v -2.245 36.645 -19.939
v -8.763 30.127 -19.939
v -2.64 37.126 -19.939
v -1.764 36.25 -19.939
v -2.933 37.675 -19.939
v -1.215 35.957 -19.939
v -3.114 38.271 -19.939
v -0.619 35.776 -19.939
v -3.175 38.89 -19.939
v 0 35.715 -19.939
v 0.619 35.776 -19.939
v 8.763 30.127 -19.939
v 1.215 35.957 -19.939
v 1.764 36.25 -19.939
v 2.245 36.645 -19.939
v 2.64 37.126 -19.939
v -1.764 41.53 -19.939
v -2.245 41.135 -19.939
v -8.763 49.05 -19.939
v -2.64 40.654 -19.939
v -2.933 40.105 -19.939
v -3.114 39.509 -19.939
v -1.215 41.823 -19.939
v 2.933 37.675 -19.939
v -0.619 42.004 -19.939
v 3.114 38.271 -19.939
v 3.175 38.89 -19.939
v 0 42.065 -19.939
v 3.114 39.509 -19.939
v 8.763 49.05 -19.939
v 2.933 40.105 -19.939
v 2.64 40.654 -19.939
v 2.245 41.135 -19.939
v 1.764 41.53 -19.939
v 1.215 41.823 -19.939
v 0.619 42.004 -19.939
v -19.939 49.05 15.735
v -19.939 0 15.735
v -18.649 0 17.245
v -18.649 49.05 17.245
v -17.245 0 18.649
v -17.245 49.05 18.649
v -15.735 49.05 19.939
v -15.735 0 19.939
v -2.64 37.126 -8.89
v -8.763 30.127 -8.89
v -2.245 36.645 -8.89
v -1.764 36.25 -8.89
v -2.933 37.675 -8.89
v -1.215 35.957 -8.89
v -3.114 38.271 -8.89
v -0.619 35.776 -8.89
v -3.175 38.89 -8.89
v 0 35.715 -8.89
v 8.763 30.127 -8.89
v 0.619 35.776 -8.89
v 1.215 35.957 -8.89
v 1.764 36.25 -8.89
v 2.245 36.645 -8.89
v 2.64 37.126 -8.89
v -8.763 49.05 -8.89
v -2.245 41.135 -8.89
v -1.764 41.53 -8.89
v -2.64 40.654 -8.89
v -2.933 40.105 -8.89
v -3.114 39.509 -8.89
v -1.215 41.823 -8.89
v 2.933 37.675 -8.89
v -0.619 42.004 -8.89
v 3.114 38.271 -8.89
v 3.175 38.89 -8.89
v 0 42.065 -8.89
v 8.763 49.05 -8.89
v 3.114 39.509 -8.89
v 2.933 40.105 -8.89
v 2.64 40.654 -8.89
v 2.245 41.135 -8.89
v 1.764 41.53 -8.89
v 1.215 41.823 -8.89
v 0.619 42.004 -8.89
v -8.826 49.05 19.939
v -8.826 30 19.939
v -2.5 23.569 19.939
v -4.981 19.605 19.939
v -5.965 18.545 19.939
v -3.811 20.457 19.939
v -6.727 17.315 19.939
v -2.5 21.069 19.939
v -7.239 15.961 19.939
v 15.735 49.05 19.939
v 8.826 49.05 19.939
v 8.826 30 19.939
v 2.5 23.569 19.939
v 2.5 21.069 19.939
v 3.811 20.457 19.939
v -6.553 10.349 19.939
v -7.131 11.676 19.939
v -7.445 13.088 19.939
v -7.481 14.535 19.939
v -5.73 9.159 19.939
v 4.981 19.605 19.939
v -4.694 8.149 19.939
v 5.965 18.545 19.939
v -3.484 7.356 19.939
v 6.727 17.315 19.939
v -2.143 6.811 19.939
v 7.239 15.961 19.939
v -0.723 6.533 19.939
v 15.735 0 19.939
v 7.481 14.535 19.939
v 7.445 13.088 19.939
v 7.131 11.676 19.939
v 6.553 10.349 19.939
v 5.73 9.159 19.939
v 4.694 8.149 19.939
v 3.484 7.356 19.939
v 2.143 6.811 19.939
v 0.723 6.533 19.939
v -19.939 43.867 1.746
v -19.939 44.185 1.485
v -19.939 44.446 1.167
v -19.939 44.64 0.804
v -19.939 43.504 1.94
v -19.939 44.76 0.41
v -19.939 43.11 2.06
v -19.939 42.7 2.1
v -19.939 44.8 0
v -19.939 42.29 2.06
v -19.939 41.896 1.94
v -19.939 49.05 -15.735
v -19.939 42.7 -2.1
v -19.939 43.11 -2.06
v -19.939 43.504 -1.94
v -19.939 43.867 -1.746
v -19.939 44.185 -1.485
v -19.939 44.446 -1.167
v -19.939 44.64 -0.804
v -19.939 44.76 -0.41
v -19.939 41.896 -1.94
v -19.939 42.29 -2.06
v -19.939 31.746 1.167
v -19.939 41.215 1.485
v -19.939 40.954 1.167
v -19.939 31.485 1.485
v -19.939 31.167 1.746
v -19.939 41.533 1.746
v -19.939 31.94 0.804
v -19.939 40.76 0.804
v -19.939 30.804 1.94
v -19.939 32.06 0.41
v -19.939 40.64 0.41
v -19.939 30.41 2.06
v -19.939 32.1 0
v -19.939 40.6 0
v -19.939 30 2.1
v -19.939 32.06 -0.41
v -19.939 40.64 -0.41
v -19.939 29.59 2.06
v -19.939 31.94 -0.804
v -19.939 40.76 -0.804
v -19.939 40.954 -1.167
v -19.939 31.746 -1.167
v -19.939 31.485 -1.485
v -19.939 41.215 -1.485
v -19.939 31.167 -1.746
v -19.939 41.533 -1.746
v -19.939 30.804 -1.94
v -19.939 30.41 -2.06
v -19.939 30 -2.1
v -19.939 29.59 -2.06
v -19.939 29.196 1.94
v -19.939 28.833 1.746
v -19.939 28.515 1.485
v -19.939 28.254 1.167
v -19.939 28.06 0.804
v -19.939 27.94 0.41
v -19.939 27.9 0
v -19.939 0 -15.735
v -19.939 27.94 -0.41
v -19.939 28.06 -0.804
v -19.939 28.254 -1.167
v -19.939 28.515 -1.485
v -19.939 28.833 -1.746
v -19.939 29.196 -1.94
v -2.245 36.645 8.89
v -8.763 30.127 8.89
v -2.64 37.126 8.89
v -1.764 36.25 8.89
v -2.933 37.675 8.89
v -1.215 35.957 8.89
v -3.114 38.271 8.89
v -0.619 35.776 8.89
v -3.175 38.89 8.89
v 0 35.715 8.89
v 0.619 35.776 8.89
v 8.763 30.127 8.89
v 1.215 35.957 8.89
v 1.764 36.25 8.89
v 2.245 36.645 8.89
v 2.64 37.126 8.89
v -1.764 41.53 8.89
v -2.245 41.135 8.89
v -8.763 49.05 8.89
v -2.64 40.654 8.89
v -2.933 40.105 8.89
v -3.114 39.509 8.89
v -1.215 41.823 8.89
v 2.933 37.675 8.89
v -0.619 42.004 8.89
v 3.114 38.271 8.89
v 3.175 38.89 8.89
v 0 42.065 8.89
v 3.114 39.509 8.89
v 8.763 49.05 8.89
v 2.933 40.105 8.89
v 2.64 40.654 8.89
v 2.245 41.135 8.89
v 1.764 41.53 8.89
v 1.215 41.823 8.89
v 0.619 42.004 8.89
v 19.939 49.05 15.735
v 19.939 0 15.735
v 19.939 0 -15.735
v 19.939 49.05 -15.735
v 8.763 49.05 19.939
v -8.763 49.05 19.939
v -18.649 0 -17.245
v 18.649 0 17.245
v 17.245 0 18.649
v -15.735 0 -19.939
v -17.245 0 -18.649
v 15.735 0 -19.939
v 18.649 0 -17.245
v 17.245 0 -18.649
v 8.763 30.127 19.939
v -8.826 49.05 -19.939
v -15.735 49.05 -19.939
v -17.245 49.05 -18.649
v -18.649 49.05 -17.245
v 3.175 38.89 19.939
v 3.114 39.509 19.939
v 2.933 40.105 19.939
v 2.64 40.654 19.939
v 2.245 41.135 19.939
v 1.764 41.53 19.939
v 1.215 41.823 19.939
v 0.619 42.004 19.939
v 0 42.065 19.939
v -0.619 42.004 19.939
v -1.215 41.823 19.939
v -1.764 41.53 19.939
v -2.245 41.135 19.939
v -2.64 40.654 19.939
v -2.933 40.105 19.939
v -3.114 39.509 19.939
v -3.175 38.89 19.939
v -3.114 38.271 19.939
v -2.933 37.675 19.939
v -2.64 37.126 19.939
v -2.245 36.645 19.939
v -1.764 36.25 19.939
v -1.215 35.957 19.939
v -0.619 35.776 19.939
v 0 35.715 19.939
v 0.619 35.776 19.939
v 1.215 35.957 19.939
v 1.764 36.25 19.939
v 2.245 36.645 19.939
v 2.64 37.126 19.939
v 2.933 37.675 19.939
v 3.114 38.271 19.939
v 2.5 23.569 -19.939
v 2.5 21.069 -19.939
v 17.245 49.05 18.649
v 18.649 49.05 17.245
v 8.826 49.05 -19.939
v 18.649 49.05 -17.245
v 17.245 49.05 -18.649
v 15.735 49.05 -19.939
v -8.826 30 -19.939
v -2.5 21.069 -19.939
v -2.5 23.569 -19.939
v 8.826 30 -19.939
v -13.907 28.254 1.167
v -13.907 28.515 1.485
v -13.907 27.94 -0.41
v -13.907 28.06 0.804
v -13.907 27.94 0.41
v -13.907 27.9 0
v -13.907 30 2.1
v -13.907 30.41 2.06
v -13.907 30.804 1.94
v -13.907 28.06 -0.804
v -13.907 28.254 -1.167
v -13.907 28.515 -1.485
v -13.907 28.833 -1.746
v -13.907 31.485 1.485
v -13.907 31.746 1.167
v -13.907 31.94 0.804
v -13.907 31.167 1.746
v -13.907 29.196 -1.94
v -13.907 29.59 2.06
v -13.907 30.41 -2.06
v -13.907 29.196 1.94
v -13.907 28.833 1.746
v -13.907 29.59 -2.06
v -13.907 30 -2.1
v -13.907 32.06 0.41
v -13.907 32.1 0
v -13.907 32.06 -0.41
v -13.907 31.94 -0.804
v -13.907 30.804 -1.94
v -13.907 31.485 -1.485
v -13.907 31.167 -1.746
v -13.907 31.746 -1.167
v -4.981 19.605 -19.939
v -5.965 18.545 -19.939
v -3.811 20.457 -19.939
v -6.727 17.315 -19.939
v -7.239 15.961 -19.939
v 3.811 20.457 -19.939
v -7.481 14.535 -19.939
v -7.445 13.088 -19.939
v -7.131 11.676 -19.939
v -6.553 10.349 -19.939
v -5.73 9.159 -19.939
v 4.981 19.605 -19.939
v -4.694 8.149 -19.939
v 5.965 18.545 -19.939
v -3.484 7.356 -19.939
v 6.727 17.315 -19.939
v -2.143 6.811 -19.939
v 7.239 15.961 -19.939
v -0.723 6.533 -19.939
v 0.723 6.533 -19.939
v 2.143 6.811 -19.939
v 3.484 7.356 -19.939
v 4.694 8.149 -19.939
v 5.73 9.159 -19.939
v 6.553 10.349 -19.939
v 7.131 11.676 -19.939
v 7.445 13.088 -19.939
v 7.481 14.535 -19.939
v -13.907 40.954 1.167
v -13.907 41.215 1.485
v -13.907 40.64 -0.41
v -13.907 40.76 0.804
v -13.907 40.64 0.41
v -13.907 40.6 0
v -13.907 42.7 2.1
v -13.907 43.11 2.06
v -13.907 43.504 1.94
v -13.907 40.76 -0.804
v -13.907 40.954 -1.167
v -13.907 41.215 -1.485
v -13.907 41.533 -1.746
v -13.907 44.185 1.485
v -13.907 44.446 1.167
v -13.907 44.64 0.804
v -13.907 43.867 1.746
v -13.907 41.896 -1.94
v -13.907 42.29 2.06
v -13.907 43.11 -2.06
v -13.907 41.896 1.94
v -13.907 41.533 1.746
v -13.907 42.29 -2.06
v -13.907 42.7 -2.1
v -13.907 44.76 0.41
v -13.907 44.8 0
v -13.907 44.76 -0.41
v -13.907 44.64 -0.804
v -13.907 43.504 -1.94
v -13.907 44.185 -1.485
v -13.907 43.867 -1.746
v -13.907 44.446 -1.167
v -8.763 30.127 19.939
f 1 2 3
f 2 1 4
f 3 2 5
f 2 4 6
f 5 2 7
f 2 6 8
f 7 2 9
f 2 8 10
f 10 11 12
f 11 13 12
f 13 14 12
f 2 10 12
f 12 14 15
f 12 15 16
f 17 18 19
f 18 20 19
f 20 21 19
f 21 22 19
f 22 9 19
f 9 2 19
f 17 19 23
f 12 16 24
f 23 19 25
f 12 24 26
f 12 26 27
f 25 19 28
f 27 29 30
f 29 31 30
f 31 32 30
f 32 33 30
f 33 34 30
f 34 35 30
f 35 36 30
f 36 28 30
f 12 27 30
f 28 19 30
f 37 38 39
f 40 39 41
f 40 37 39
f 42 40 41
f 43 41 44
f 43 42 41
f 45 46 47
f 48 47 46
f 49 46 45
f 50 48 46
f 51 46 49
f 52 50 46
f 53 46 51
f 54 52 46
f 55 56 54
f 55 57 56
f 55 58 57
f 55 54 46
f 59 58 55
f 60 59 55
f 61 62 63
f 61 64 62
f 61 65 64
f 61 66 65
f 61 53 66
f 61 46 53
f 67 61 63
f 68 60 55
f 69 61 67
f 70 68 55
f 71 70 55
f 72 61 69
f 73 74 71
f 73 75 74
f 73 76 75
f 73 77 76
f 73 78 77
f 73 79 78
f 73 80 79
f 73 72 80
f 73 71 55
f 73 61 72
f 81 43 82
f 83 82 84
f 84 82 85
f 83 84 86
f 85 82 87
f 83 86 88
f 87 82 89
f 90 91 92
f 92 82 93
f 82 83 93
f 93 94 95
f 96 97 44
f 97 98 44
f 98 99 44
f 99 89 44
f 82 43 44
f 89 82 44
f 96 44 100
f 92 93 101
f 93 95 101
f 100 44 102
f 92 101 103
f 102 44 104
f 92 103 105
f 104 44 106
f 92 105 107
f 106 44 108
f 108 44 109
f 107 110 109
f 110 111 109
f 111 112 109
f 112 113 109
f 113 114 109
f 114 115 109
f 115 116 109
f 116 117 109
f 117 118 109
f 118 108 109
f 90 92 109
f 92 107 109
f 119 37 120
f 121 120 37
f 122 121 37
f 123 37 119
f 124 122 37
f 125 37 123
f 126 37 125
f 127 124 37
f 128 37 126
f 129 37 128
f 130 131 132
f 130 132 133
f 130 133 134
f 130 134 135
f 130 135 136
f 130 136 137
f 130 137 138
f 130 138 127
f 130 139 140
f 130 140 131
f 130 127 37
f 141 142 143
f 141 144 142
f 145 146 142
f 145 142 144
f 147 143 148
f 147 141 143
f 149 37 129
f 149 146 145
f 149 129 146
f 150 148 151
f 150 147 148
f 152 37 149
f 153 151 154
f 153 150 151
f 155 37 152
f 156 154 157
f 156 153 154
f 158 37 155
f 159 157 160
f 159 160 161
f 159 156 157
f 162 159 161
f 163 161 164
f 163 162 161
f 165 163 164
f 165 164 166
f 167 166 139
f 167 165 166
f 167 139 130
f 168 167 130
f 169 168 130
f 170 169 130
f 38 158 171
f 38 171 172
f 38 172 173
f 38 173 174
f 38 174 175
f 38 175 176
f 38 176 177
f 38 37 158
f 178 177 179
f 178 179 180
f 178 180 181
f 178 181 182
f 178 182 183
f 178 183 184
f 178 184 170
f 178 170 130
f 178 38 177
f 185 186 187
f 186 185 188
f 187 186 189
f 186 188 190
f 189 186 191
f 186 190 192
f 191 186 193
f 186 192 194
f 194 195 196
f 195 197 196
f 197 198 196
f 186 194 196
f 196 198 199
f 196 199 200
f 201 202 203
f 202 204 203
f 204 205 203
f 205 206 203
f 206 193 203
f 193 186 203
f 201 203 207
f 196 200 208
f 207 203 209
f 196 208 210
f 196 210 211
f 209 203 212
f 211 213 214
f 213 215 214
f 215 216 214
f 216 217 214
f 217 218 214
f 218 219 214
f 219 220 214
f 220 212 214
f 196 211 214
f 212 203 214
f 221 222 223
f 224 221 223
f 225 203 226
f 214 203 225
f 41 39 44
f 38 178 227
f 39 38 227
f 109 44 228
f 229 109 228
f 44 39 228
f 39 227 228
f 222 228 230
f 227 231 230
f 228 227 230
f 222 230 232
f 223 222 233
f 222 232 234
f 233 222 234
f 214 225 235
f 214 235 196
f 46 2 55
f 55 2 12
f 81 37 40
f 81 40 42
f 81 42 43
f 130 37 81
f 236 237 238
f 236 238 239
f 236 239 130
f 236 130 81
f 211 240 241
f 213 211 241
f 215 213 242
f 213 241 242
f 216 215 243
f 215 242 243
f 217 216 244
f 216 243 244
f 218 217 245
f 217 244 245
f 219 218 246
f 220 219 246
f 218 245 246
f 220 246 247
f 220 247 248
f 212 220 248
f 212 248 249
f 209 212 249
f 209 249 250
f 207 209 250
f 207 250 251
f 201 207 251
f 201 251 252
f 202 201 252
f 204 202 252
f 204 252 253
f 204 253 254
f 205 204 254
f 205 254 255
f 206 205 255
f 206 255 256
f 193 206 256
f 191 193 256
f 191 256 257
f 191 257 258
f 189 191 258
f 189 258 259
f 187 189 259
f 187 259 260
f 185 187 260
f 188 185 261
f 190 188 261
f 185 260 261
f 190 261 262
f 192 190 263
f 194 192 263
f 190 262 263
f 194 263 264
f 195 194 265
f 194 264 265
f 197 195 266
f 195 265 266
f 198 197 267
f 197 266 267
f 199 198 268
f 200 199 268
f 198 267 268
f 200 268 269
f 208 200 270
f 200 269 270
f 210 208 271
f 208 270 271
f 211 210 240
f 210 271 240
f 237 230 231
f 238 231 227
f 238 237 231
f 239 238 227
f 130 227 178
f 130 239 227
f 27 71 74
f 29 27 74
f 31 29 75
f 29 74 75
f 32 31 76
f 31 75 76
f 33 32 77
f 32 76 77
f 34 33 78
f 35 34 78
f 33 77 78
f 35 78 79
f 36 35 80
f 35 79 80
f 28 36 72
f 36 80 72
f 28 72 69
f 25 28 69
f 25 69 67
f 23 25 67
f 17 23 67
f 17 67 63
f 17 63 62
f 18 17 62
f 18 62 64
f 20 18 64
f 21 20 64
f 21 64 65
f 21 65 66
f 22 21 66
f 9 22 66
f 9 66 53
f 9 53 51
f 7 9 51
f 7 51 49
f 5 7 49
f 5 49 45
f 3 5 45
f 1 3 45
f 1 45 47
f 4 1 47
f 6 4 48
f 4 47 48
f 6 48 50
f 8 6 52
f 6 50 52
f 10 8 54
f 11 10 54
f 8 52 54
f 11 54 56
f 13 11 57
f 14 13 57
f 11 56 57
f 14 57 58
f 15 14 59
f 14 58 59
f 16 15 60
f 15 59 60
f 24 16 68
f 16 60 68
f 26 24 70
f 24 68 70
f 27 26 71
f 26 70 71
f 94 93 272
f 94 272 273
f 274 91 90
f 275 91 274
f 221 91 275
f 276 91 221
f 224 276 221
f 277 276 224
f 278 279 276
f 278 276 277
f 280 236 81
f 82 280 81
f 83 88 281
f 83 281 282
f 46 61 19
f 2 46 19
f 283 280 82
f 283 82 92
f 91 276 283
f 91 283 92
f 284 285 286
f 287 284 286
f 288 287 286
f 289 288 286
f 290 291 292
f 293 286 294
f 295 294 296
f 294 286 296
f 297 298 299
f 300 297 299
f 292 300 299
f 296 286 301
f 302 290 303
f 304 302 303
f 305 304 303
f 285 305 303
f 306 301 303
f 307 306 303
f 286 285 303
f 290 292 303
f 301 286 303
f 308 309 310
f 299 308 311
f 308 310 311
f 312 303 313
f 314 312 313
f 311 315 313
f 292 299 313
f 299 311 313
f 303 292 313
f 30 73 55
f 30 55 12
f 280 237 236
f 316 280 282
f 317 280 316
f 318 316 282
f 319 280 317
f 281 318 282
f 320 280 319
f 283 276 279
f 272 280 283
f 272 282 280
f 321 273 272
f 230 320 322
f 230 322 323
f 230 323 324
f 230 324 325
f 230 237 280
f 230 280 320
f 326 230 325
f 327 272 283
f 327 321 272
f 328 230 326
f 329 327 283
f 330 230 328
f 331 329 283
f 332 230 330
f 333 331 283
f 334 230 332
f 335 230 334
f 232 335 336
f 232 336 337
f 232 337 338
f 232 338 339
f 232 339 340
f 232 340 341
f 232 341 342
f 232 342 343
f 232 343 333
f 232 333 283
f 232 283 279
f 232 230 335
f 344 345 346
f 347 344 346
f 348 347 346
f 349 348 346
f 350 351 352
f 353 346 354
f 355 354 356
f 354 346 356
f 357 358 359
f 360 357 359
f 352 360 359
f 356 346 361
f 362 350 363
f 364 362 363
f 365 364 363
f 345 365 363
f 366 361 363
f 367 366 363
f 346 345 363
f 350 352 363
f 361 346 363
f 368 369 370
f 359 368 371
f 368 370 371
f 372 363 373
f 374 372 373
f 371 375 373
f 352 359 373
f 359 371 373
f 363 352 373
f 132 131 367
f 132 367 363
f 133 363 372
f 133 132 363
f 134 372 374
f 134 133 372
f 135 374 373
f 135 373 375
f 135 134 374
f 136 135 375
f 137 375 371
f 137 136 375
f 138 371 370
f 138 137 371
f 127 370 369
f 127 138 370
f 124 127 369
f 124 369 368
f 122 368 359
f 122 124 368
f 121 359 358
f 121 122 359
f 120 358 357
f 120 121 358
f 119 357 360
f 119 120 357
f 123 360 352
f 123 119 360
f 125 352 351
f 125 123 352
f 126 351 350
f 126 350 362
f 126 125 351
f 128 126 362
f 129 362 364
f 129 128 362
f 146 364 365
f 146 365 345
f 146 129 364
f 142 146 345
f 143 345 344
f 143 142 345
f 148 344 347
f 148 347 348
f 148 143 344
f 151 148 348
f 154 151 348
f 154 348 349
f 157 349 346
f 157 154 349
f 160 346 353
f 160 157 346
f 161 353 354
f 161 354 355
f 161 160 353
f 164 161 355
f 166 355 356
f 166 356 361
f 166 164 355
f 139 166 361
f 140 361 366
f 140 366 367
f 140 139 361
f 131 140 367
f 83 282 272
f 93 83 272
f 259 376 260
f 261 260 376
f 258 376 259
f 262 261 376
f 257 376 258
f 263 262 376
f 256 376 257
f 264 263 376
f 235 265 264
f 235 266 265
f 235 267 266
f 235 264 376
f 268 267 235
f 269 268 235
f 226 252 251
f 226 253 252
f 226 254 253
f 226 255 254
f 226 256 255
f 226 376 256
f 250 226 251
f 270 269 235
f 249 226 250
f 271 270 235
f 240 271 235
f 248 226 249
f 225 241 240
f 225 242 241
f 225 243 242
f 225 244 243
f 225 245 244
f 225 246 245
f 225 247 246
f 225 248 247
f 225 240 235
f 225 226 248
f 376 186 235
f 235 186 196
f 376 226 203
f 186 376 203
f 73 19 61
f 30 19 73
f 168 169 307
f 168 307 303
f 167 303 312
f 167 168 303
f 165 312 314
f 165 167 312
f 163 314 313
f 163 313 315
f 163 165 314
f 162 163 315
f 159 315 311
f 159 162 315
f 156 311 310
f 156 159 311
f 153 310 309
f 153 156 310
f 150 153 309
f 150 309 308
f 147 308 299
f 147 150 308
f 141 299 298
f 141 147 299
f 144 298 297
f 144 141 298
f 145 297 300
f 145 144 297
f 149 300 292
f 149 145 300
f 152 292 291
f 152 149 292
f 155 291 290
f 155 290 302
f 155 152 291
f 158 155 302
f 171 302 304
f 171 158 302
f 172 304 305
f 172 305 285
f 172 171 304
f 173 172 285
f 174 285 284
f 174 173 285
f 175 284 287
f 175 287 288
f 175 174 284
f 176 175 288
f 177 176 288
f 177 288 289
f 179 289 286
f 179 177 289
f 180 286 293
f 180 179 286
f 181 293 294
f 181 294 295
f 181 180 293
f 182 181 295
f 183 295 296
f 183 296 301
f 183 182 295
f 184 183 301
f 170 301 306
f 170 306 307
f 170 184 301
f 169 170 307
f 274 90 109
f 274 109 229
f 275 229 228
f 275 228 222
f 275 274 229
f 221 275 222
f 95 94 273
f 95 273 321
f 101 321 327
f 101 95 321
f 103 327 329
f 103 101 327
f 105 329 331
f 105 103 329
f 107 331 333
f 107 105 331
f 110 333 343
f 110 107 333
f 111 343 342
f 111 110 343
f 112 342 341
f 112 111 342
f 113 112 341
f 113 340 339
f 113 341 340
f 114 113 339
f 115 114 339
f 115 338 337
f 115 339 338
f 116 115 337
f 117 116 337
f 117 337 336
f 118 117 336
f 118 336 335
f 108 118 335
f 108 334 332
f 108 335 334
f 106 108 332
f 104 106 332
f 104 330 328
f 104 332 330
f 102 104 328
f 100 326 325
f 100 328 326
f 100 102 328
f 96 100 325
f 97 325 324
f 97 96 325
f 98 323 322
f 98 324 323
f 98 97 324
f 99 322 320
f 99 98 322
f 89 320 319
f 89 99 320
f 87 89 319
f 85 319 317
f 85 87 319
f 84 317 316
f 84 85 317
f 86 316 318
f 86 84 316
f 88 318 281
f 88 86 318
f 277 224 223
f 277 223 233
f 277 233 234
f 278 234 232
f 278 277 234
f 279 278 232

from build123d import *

# Parameters (mm, degrees)
SKETCH1_W             = 39.878
SKETCH1_H             = 39.878
BOSS_EXTRUDE1_DEPTH   = 49.05
SKETCH2_W             = 17.653
SKETCH2_H             = 39.878
CUT_EXTRUDE1_DEPTH    = 19.05
SKETCH4_R             = 30.48
SKETCH4_R_2           = 25.4
CUT_EXTRUDE3_DEPTH    = 57.57764525
CUT_EXTRUDE5_DEPTH    = 67.285149958
SKETCH7_W             = 17.526
SKETCH7_H             = 11.049
BOSS_EXTRUDE2_DEPTH   = 18.923
BOSS_EXTRUDE2_2_DEPTH = 18.923
SKETCH8_R             = 3.175
CUT_EXTRUDE6_DEPTH    = 67.285149958
SKETCH9_R             = 2.1
CUT_EXTRUDE7_DEPTH    = 6.0325


with BuildPart() as part:
    # Sketch1 → Boss-Extrude1 (new body)
    with BuildSketch(Plane(origin=(0, 0, 0), x_dir=(1, 0, 0), z_dir=(0, 1, 0))):
        Rectangle(SKETCH1_W, SKETCH1_H)
    extrude(amount=BOSS_EXTRUDE1_DEPTH)

    # Sketch2 → Cut-Extrude1 (cut)
    with BuildSketch(Plane.XZ.offset(-49.05)):
        Rectangle(SKETCH2_W, SKETCH2_H)
    extrude(amount=CUT_EXTRUDE1_DEPTH, mode=Mode.SUBTRACT)

    # Sketch4 → Cut-Extrude3 (cut, through all)
    with BuildSketch(Plane(origin=(0, 49.05, 0), x_dir=(1, 0, 0), z_dir=(0, 1, 0))):
        Circle(SKETCH4_R)
        Circle(SKETCH4_R_2, mode=Mode.SUBTRACT)
    extrude(amount=-CUT_EXTRUDE3_DEPTH, mode=Mode.SUBTRACT)

    # Sketch6 → Cut-Extrude5 (cut, through all)
    with BuildSketch(Plane.XY.offset(19.939)):
        with BuildLine():
            Line((-2.5, 21.069067812), (-2.5, 23.569067812))
            Line((-2.5, 23.569067812), (2.5, 23.569067812))
            Line((2.5, 23.569067812), (2.5, 21.069067812))
            ThreePointArc((2.5, 21.069067812), (0, 6.498), (-2.5, 21.069067812))
        make_face()
    extrude(amount=-CUT_EXTRUDE5_DEPTH, mode=Mode.SUBTRACT)

    # Sketch9 → Cut-Extrude7 (cut)
    with BuildSketch(Plane(origin=(-19.939, 0, 0), x_dir=(0, 0, -1), z_dir=(1, 0, 0))):
        with Locations((0, 42.7)):
            Circle(SKETCH9_R)
        with Locations((0, 30)):
            Circle(SKETCH9_R)
    extrude(amount=CUT_EXTRUDE7_DEPTH, mode=Mode.SUBTRACT)


with BuildPart() as body_2:
    # Sketch7 → Boss-Extrude2 (new body)
    with BuildSketch(Plane(origin=(0, 49.05, 0), x_dir=(1, 0, 0), z_dir=(0, 1, 0))):
        with Locations((0, -14.4145)):
            Rectangle(SKETCH7_W, SKETCH7_H)
    extrude(amount=-BOSS_EXTRUDE2_DEPTH)


with BuildPart() as body_3:
    # Sketch7 → Boss-Extrude2 2 (new body)
    with BuildSketch(Plane(origin=(0, 49.05, 0), x_dir=(1, 0, 0), z_dir=(0, 1, 0))):
        with Locations((0, 14.4145)):
            Rectangle(SKETCH7_W, SKETCH7_H)
    extrude(amount=-BOSS_EXTRUDE2_2_DEPTH)


with BuildPart() as cut_extrude6_tool:
    # Sketch8 → Cut-Extrude6 (new, through all)
    with BuildSketch(Plane.XY.offset(19.939)):
        with Locations((0, 38.89)):
            Circle(SKETCH8_R)
    extrude(amount=-CUT_EXTRUDE6_DEPTH)


with BuildPart() as body_2_1:
    add(body_2.part)

    # Cut-Extrude6: cut by cut_extrude6_tool
    add(cut_extrude6_tool.part, mode=Mode.SUBTRACT)


with BuildPart() as body_3_1:
    add(body_3.part)

    # Cut-Extrude6: cut by cut_extrude6_tool
    add(cut_extrude6_tool.part, mode=Mode.SUBTRACT)


solid = Compound([part.part, body_2_1.part, body_3_1.part])
